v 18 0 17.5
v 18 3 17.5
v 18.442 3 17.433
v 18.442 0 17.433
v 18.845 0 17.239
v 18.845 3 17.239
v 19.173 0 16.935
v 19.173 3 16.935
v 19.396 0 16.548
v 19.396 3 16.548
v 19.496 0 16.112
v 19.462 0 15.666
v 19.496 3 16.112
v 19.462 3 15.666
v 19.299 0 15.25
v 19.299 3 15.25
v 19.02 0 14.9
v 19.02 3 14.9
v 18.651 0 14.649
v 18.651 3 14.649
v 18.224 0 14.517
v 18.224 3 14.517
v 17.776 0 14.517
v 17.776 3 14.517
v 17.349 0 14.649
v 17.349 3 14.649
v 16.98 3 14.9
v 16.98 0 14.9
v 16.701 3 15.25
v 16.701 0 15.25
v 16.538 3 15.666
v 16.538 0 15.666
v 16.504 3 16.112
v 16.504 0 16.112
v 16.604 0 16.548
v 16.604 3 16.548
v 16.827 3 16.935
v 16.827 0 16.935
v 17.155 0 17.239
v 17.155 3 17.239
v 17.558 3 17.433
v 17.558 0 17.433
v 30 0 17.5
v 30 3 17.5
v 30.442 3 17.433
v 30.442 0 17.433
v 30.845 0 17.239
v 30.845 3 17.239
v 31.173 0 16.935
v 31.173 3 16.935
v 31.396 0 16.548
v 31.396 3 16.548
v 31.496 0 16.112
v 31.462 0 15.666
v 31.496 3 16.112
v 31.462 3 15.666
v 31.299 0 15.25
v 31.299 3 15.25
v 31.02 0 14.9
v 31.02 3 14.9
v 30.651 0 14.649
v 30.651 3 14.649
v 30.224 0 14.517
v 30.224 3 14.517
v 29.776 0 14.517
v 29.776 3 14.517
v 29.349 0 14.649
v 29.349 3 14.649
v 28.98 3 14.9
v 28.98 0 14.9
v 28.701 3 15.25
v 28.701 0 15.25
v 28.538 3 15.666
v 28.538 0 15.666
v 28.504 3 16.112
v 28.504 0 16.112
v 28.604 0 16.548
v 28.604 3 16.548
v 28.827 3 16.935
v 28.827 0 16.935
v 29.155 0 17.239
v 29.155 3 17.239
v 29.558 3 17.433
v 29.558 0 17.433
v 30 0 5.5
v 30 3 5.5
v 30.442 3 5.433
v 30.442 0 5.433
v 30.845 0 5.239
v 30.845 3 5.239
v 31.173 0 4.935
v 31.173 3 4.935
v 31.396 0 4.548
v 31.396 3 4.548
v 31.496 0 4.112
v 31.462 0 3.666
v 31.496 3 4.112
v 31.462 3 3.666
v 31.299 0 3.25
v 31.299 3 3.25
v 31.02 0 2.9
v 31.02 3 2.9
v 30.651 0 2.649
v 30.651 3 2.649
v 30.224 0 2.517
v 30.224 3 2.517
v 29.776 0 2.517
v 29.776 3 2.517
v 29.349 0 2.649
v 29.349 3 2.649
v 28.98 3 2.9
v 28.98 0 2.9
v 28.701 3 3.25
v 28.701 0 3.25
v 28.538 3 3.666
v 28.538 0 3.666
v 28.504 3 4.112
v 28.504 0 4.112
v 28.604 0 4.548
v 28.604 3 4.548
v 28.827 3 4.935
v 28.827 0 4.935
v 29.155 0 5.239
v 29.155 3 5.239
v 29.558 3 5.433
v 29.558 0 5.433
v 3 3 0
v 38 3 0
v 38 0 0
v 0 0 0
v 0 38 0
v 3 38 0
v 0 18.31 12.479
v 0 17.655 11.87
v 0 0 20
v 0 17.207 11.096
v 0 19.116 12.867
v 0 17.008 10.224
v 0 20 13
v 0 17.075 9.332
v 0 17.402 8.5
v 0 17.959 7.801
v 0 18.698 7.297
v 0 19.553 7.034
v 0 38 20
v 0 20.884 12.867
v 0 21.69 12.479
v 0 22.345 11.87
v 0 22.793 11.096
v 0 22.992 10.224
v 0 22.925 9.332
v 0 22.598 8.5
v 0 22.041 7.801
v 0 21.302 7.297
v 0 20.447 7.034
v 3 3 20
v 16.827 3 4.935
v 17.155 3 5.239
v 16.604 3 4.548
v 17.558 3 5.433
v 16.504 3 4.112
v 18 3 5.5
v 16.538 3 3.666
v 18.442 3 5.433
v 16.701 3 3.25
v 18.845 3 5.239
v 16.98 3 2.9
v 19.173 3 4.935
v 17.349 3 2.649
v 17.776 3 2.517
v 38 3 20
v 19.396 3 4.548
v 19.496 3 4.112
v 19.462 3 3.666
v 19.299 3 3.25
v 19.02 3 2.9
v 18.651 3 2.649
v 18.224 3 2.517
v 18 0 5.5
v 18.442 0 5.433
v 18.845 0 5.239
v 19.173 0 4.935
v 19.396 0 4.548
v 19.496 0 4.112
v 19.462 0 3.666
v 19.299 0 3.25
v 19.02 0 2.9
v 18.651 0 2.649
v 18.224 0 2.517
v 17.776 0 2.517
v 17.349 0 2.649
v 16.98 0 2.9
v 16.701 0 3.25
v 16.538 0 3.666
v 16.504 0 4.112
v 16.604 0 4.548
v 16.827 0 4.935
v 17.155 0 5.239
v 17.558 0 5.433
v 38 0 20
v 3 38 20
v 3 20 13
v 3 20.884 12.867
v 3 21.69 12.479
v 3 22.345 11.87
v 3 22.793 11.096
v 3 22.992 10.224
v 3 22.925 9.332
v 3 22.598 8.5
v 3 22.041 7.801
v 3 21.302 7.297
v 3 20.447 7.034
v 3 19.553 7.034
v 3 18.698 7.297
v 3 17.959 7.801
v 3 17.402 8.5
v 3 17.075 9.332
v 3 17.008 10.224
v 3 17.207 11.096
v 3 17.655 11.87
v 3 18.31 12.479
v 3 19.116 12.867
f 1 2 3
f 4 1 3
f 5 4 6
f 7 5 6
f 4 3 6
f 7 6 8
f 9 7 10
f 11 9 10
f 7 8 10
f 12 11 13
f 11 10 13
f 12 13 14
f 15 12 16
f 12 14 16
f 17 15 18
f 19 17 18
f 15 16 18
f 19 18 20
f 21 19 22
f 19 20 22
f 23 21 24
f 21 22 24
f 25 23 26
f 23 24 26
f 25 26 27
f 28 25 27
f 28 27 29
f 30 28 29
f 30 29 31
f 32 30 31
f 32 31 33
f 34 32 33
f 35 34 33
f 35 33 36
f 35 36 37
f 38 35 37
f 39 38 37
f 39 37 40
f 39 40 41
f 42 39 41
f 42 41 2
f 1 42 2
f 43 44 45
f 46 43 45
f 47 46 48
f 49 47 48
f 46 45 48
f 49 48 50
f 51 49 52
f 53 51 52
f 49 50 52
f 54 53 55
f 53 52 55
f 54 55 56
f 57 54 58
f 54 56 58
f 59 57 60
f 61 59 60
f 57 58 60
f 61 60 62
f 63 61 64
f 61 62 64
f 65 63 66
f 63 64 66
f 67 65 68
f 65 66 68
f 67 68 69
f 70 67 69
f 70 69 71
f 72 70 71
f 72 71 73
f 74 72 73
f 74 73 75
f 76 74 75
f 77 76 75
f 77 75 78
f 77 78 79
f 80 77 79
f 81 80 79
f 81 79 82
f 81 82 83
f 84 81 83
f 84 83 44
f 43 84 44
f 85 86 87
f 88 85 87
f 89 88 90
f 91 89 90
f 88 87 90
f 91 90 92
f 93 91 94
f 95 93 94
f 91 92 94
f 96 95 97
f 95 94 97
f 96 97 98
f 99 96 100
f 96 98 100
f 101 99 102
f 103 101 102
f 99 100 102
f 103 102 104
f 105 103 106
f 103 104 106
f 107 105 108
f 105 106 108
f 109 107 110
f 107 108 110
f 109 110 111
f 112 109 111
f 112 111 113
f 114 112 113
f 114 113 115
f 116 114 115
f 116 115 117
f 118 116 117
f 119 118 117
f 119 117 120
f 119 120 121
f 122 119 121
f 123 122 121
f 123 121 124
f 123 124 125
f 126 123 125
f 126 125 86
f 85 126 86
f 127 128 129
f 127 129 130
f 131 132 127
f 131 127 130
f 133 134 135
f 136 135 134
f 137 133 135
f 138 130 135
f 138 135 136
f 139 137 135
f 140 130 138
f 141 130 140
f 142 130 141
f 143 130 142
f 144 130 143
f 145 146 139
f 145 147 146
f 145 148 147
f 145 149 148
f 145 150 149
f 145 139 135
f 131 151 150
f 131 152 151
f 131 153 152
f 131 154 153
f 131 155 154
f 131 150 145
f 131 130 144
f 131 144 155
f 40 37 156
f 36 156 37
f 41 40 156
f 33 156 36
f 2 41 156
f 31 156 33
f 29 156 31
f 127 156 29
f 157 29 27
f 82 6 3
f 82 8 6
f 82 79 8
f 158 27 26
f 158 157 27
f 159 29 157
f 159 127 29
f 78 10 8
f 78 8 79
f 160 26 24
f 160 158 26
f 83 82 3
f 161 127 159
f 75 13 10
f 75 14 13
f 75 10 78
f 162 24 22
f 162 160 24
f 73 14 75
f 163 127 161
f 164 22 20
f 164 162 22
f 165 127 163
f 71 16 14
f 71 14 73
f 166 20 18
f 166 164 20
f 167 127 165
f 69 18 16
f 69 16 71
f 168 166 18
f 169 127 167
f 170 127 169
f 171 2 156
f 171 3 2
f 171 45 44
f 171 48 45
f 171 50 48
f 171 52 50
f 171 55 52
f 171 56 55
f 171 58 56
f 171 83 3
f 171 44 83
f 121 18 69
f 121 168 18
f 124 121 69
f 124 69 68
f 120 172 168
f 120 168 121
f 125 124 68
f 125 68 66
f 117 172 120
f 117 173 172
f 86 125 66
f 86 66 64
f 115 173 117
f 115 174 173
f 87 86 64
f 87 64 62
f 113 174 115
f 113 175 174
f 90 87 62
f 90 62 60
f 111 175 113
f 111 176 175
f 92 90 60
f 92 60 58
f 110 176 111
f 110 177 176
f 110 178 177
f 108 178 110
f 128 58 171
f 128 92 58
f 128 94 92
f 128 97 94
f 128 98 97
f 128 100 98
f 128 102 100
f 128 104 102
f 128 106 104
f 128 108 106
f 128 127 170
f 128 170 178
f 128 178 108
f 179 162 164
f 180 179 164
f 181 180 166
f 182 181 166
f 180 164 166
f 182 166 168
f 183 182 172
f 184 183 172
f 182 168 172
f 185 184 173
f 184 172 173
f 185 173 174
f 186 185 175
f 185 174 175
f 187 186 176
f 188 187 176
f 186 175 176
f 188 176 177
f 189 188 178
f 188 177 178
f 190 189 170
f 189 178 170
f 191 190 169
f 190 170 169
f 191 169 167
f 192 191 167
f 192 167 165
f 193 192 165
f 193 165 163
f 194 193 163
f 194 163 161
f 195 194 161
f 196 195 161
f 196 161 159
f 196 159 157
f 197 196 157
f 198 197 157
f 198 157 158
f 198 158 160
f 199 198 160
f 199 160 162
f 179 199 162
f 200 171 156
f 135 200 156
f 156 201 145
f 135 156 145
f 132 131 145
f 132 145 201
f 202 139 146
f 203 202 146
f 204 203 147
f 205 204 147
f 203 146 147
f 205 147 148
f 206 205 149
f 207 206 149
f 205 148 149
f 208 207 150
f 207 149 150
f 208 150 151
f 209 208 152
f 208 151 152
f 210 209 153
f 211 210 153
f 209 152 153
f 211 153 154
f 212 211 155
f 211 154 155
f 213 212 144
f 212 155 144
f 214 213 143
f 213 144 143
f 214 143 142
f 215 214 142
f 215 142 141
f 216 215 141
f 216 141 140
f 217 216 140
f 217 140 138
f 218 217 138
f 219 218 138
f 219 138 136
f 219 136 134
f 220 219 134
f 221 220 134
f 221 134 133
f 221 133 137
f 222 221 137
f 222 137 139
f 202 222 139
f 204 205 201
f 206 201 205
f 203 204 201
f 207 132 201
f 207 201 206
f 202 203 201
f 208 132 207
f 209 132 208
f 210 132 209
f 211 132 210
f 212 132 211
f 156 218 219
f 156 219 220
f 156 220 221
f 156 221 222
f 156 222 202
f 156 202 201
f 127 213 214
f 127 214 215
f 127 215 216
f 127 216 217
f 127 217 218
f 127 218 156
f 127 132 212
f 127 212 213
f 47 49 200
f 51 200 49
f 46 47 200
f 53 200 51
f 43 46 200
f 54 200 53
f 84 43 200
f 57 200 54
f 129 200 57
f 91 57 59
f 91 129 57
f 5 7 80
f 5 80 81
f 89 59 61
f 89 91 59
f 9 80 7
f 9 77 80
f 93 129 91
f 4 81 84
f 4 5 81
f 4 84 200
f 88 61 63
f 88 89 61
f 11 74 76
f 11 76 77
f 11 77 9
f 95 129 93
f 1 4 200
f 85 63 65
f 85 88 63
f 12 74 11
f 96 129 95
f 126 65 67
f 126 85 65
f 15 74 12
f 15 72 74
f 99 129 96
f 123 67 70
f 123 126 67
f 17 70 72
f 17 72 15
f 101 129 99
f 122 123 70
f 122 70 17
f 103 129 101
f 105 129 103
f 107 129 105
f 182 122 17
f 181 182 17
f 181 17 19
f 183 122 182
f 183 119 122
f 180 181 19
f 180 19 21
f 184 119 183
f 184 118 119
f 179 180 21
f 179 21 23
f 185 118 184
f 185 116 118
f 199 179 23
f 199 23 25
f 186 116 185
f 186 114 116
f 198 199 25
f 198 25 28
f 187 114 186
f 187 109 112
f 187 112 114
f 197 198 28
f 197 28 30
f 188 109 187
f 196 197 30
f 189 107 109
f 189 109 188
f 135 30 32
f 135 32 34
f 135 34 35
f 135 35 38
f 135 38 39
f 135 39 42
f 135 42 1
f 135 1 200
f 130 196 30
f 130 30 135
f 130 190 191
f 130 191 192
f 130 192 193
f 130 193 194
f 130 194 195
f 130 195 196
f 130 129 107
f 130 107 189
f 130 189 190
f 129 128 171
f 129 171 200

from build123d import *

# Parameters (mm, degrees)
EXTRUDE_1_DEPTH     = 20
SKETCH_2_R          = 3
CUT_EXTRUDE_1_DEPTH = 58.341084747
SKETCH_3_R          = 1.5
CUT_EXTRUDE_2_DEPTH = 56.398555938


with BuildPart() as part:
    # 草图1 → 凸台-拉伸1 (new body)
    with BuildSketch(Plane.XY):
        Polygon((0, 0), (0, 38), (3, 38), (3, 3), (38, 3), (38, 0), align=None)
    extrude(amount=EXTRUDE_1_DEPTH)

    # 草图2 → 切除-拉伸1 (cut, through all)
    with BuildSketch(Plane.ZY):
        with Locations((10, 20)):
            Circle(SKETCH_2_R)
    extrude(amount=-CUT_EXTRUDE_1_DEPTH, mode=Mode.SUBTRACT)

    # 草图3 → 切除-拉伸2 (cut, through all)
    with BuildSketch(Plane(origin=(0, 3, 0), x_dir=(1, 0, 0), z_dir=(0, 1, 0))):
        with Locations(Location((18, -4, 0), (0, 0, 270))):
            Circle(SKETCH_3_R)
        with Locations(Location((18, -16, 0), (0, 0, 270))):
            Circle(SKETCH_3_R)
        with Locations(Location((30, -4, 0), (0, 0, 270))):
            Circle(SKETCH_3_R)
        with Locations(Location((30, -16, 0), (0, 0, 270))):
            Circle(SKETCH_3_R)
    extrude(amount=-CUT_EXTRUDE_2_DEPTH, mode=Mode.SUBTRACT)


solid = part.part
